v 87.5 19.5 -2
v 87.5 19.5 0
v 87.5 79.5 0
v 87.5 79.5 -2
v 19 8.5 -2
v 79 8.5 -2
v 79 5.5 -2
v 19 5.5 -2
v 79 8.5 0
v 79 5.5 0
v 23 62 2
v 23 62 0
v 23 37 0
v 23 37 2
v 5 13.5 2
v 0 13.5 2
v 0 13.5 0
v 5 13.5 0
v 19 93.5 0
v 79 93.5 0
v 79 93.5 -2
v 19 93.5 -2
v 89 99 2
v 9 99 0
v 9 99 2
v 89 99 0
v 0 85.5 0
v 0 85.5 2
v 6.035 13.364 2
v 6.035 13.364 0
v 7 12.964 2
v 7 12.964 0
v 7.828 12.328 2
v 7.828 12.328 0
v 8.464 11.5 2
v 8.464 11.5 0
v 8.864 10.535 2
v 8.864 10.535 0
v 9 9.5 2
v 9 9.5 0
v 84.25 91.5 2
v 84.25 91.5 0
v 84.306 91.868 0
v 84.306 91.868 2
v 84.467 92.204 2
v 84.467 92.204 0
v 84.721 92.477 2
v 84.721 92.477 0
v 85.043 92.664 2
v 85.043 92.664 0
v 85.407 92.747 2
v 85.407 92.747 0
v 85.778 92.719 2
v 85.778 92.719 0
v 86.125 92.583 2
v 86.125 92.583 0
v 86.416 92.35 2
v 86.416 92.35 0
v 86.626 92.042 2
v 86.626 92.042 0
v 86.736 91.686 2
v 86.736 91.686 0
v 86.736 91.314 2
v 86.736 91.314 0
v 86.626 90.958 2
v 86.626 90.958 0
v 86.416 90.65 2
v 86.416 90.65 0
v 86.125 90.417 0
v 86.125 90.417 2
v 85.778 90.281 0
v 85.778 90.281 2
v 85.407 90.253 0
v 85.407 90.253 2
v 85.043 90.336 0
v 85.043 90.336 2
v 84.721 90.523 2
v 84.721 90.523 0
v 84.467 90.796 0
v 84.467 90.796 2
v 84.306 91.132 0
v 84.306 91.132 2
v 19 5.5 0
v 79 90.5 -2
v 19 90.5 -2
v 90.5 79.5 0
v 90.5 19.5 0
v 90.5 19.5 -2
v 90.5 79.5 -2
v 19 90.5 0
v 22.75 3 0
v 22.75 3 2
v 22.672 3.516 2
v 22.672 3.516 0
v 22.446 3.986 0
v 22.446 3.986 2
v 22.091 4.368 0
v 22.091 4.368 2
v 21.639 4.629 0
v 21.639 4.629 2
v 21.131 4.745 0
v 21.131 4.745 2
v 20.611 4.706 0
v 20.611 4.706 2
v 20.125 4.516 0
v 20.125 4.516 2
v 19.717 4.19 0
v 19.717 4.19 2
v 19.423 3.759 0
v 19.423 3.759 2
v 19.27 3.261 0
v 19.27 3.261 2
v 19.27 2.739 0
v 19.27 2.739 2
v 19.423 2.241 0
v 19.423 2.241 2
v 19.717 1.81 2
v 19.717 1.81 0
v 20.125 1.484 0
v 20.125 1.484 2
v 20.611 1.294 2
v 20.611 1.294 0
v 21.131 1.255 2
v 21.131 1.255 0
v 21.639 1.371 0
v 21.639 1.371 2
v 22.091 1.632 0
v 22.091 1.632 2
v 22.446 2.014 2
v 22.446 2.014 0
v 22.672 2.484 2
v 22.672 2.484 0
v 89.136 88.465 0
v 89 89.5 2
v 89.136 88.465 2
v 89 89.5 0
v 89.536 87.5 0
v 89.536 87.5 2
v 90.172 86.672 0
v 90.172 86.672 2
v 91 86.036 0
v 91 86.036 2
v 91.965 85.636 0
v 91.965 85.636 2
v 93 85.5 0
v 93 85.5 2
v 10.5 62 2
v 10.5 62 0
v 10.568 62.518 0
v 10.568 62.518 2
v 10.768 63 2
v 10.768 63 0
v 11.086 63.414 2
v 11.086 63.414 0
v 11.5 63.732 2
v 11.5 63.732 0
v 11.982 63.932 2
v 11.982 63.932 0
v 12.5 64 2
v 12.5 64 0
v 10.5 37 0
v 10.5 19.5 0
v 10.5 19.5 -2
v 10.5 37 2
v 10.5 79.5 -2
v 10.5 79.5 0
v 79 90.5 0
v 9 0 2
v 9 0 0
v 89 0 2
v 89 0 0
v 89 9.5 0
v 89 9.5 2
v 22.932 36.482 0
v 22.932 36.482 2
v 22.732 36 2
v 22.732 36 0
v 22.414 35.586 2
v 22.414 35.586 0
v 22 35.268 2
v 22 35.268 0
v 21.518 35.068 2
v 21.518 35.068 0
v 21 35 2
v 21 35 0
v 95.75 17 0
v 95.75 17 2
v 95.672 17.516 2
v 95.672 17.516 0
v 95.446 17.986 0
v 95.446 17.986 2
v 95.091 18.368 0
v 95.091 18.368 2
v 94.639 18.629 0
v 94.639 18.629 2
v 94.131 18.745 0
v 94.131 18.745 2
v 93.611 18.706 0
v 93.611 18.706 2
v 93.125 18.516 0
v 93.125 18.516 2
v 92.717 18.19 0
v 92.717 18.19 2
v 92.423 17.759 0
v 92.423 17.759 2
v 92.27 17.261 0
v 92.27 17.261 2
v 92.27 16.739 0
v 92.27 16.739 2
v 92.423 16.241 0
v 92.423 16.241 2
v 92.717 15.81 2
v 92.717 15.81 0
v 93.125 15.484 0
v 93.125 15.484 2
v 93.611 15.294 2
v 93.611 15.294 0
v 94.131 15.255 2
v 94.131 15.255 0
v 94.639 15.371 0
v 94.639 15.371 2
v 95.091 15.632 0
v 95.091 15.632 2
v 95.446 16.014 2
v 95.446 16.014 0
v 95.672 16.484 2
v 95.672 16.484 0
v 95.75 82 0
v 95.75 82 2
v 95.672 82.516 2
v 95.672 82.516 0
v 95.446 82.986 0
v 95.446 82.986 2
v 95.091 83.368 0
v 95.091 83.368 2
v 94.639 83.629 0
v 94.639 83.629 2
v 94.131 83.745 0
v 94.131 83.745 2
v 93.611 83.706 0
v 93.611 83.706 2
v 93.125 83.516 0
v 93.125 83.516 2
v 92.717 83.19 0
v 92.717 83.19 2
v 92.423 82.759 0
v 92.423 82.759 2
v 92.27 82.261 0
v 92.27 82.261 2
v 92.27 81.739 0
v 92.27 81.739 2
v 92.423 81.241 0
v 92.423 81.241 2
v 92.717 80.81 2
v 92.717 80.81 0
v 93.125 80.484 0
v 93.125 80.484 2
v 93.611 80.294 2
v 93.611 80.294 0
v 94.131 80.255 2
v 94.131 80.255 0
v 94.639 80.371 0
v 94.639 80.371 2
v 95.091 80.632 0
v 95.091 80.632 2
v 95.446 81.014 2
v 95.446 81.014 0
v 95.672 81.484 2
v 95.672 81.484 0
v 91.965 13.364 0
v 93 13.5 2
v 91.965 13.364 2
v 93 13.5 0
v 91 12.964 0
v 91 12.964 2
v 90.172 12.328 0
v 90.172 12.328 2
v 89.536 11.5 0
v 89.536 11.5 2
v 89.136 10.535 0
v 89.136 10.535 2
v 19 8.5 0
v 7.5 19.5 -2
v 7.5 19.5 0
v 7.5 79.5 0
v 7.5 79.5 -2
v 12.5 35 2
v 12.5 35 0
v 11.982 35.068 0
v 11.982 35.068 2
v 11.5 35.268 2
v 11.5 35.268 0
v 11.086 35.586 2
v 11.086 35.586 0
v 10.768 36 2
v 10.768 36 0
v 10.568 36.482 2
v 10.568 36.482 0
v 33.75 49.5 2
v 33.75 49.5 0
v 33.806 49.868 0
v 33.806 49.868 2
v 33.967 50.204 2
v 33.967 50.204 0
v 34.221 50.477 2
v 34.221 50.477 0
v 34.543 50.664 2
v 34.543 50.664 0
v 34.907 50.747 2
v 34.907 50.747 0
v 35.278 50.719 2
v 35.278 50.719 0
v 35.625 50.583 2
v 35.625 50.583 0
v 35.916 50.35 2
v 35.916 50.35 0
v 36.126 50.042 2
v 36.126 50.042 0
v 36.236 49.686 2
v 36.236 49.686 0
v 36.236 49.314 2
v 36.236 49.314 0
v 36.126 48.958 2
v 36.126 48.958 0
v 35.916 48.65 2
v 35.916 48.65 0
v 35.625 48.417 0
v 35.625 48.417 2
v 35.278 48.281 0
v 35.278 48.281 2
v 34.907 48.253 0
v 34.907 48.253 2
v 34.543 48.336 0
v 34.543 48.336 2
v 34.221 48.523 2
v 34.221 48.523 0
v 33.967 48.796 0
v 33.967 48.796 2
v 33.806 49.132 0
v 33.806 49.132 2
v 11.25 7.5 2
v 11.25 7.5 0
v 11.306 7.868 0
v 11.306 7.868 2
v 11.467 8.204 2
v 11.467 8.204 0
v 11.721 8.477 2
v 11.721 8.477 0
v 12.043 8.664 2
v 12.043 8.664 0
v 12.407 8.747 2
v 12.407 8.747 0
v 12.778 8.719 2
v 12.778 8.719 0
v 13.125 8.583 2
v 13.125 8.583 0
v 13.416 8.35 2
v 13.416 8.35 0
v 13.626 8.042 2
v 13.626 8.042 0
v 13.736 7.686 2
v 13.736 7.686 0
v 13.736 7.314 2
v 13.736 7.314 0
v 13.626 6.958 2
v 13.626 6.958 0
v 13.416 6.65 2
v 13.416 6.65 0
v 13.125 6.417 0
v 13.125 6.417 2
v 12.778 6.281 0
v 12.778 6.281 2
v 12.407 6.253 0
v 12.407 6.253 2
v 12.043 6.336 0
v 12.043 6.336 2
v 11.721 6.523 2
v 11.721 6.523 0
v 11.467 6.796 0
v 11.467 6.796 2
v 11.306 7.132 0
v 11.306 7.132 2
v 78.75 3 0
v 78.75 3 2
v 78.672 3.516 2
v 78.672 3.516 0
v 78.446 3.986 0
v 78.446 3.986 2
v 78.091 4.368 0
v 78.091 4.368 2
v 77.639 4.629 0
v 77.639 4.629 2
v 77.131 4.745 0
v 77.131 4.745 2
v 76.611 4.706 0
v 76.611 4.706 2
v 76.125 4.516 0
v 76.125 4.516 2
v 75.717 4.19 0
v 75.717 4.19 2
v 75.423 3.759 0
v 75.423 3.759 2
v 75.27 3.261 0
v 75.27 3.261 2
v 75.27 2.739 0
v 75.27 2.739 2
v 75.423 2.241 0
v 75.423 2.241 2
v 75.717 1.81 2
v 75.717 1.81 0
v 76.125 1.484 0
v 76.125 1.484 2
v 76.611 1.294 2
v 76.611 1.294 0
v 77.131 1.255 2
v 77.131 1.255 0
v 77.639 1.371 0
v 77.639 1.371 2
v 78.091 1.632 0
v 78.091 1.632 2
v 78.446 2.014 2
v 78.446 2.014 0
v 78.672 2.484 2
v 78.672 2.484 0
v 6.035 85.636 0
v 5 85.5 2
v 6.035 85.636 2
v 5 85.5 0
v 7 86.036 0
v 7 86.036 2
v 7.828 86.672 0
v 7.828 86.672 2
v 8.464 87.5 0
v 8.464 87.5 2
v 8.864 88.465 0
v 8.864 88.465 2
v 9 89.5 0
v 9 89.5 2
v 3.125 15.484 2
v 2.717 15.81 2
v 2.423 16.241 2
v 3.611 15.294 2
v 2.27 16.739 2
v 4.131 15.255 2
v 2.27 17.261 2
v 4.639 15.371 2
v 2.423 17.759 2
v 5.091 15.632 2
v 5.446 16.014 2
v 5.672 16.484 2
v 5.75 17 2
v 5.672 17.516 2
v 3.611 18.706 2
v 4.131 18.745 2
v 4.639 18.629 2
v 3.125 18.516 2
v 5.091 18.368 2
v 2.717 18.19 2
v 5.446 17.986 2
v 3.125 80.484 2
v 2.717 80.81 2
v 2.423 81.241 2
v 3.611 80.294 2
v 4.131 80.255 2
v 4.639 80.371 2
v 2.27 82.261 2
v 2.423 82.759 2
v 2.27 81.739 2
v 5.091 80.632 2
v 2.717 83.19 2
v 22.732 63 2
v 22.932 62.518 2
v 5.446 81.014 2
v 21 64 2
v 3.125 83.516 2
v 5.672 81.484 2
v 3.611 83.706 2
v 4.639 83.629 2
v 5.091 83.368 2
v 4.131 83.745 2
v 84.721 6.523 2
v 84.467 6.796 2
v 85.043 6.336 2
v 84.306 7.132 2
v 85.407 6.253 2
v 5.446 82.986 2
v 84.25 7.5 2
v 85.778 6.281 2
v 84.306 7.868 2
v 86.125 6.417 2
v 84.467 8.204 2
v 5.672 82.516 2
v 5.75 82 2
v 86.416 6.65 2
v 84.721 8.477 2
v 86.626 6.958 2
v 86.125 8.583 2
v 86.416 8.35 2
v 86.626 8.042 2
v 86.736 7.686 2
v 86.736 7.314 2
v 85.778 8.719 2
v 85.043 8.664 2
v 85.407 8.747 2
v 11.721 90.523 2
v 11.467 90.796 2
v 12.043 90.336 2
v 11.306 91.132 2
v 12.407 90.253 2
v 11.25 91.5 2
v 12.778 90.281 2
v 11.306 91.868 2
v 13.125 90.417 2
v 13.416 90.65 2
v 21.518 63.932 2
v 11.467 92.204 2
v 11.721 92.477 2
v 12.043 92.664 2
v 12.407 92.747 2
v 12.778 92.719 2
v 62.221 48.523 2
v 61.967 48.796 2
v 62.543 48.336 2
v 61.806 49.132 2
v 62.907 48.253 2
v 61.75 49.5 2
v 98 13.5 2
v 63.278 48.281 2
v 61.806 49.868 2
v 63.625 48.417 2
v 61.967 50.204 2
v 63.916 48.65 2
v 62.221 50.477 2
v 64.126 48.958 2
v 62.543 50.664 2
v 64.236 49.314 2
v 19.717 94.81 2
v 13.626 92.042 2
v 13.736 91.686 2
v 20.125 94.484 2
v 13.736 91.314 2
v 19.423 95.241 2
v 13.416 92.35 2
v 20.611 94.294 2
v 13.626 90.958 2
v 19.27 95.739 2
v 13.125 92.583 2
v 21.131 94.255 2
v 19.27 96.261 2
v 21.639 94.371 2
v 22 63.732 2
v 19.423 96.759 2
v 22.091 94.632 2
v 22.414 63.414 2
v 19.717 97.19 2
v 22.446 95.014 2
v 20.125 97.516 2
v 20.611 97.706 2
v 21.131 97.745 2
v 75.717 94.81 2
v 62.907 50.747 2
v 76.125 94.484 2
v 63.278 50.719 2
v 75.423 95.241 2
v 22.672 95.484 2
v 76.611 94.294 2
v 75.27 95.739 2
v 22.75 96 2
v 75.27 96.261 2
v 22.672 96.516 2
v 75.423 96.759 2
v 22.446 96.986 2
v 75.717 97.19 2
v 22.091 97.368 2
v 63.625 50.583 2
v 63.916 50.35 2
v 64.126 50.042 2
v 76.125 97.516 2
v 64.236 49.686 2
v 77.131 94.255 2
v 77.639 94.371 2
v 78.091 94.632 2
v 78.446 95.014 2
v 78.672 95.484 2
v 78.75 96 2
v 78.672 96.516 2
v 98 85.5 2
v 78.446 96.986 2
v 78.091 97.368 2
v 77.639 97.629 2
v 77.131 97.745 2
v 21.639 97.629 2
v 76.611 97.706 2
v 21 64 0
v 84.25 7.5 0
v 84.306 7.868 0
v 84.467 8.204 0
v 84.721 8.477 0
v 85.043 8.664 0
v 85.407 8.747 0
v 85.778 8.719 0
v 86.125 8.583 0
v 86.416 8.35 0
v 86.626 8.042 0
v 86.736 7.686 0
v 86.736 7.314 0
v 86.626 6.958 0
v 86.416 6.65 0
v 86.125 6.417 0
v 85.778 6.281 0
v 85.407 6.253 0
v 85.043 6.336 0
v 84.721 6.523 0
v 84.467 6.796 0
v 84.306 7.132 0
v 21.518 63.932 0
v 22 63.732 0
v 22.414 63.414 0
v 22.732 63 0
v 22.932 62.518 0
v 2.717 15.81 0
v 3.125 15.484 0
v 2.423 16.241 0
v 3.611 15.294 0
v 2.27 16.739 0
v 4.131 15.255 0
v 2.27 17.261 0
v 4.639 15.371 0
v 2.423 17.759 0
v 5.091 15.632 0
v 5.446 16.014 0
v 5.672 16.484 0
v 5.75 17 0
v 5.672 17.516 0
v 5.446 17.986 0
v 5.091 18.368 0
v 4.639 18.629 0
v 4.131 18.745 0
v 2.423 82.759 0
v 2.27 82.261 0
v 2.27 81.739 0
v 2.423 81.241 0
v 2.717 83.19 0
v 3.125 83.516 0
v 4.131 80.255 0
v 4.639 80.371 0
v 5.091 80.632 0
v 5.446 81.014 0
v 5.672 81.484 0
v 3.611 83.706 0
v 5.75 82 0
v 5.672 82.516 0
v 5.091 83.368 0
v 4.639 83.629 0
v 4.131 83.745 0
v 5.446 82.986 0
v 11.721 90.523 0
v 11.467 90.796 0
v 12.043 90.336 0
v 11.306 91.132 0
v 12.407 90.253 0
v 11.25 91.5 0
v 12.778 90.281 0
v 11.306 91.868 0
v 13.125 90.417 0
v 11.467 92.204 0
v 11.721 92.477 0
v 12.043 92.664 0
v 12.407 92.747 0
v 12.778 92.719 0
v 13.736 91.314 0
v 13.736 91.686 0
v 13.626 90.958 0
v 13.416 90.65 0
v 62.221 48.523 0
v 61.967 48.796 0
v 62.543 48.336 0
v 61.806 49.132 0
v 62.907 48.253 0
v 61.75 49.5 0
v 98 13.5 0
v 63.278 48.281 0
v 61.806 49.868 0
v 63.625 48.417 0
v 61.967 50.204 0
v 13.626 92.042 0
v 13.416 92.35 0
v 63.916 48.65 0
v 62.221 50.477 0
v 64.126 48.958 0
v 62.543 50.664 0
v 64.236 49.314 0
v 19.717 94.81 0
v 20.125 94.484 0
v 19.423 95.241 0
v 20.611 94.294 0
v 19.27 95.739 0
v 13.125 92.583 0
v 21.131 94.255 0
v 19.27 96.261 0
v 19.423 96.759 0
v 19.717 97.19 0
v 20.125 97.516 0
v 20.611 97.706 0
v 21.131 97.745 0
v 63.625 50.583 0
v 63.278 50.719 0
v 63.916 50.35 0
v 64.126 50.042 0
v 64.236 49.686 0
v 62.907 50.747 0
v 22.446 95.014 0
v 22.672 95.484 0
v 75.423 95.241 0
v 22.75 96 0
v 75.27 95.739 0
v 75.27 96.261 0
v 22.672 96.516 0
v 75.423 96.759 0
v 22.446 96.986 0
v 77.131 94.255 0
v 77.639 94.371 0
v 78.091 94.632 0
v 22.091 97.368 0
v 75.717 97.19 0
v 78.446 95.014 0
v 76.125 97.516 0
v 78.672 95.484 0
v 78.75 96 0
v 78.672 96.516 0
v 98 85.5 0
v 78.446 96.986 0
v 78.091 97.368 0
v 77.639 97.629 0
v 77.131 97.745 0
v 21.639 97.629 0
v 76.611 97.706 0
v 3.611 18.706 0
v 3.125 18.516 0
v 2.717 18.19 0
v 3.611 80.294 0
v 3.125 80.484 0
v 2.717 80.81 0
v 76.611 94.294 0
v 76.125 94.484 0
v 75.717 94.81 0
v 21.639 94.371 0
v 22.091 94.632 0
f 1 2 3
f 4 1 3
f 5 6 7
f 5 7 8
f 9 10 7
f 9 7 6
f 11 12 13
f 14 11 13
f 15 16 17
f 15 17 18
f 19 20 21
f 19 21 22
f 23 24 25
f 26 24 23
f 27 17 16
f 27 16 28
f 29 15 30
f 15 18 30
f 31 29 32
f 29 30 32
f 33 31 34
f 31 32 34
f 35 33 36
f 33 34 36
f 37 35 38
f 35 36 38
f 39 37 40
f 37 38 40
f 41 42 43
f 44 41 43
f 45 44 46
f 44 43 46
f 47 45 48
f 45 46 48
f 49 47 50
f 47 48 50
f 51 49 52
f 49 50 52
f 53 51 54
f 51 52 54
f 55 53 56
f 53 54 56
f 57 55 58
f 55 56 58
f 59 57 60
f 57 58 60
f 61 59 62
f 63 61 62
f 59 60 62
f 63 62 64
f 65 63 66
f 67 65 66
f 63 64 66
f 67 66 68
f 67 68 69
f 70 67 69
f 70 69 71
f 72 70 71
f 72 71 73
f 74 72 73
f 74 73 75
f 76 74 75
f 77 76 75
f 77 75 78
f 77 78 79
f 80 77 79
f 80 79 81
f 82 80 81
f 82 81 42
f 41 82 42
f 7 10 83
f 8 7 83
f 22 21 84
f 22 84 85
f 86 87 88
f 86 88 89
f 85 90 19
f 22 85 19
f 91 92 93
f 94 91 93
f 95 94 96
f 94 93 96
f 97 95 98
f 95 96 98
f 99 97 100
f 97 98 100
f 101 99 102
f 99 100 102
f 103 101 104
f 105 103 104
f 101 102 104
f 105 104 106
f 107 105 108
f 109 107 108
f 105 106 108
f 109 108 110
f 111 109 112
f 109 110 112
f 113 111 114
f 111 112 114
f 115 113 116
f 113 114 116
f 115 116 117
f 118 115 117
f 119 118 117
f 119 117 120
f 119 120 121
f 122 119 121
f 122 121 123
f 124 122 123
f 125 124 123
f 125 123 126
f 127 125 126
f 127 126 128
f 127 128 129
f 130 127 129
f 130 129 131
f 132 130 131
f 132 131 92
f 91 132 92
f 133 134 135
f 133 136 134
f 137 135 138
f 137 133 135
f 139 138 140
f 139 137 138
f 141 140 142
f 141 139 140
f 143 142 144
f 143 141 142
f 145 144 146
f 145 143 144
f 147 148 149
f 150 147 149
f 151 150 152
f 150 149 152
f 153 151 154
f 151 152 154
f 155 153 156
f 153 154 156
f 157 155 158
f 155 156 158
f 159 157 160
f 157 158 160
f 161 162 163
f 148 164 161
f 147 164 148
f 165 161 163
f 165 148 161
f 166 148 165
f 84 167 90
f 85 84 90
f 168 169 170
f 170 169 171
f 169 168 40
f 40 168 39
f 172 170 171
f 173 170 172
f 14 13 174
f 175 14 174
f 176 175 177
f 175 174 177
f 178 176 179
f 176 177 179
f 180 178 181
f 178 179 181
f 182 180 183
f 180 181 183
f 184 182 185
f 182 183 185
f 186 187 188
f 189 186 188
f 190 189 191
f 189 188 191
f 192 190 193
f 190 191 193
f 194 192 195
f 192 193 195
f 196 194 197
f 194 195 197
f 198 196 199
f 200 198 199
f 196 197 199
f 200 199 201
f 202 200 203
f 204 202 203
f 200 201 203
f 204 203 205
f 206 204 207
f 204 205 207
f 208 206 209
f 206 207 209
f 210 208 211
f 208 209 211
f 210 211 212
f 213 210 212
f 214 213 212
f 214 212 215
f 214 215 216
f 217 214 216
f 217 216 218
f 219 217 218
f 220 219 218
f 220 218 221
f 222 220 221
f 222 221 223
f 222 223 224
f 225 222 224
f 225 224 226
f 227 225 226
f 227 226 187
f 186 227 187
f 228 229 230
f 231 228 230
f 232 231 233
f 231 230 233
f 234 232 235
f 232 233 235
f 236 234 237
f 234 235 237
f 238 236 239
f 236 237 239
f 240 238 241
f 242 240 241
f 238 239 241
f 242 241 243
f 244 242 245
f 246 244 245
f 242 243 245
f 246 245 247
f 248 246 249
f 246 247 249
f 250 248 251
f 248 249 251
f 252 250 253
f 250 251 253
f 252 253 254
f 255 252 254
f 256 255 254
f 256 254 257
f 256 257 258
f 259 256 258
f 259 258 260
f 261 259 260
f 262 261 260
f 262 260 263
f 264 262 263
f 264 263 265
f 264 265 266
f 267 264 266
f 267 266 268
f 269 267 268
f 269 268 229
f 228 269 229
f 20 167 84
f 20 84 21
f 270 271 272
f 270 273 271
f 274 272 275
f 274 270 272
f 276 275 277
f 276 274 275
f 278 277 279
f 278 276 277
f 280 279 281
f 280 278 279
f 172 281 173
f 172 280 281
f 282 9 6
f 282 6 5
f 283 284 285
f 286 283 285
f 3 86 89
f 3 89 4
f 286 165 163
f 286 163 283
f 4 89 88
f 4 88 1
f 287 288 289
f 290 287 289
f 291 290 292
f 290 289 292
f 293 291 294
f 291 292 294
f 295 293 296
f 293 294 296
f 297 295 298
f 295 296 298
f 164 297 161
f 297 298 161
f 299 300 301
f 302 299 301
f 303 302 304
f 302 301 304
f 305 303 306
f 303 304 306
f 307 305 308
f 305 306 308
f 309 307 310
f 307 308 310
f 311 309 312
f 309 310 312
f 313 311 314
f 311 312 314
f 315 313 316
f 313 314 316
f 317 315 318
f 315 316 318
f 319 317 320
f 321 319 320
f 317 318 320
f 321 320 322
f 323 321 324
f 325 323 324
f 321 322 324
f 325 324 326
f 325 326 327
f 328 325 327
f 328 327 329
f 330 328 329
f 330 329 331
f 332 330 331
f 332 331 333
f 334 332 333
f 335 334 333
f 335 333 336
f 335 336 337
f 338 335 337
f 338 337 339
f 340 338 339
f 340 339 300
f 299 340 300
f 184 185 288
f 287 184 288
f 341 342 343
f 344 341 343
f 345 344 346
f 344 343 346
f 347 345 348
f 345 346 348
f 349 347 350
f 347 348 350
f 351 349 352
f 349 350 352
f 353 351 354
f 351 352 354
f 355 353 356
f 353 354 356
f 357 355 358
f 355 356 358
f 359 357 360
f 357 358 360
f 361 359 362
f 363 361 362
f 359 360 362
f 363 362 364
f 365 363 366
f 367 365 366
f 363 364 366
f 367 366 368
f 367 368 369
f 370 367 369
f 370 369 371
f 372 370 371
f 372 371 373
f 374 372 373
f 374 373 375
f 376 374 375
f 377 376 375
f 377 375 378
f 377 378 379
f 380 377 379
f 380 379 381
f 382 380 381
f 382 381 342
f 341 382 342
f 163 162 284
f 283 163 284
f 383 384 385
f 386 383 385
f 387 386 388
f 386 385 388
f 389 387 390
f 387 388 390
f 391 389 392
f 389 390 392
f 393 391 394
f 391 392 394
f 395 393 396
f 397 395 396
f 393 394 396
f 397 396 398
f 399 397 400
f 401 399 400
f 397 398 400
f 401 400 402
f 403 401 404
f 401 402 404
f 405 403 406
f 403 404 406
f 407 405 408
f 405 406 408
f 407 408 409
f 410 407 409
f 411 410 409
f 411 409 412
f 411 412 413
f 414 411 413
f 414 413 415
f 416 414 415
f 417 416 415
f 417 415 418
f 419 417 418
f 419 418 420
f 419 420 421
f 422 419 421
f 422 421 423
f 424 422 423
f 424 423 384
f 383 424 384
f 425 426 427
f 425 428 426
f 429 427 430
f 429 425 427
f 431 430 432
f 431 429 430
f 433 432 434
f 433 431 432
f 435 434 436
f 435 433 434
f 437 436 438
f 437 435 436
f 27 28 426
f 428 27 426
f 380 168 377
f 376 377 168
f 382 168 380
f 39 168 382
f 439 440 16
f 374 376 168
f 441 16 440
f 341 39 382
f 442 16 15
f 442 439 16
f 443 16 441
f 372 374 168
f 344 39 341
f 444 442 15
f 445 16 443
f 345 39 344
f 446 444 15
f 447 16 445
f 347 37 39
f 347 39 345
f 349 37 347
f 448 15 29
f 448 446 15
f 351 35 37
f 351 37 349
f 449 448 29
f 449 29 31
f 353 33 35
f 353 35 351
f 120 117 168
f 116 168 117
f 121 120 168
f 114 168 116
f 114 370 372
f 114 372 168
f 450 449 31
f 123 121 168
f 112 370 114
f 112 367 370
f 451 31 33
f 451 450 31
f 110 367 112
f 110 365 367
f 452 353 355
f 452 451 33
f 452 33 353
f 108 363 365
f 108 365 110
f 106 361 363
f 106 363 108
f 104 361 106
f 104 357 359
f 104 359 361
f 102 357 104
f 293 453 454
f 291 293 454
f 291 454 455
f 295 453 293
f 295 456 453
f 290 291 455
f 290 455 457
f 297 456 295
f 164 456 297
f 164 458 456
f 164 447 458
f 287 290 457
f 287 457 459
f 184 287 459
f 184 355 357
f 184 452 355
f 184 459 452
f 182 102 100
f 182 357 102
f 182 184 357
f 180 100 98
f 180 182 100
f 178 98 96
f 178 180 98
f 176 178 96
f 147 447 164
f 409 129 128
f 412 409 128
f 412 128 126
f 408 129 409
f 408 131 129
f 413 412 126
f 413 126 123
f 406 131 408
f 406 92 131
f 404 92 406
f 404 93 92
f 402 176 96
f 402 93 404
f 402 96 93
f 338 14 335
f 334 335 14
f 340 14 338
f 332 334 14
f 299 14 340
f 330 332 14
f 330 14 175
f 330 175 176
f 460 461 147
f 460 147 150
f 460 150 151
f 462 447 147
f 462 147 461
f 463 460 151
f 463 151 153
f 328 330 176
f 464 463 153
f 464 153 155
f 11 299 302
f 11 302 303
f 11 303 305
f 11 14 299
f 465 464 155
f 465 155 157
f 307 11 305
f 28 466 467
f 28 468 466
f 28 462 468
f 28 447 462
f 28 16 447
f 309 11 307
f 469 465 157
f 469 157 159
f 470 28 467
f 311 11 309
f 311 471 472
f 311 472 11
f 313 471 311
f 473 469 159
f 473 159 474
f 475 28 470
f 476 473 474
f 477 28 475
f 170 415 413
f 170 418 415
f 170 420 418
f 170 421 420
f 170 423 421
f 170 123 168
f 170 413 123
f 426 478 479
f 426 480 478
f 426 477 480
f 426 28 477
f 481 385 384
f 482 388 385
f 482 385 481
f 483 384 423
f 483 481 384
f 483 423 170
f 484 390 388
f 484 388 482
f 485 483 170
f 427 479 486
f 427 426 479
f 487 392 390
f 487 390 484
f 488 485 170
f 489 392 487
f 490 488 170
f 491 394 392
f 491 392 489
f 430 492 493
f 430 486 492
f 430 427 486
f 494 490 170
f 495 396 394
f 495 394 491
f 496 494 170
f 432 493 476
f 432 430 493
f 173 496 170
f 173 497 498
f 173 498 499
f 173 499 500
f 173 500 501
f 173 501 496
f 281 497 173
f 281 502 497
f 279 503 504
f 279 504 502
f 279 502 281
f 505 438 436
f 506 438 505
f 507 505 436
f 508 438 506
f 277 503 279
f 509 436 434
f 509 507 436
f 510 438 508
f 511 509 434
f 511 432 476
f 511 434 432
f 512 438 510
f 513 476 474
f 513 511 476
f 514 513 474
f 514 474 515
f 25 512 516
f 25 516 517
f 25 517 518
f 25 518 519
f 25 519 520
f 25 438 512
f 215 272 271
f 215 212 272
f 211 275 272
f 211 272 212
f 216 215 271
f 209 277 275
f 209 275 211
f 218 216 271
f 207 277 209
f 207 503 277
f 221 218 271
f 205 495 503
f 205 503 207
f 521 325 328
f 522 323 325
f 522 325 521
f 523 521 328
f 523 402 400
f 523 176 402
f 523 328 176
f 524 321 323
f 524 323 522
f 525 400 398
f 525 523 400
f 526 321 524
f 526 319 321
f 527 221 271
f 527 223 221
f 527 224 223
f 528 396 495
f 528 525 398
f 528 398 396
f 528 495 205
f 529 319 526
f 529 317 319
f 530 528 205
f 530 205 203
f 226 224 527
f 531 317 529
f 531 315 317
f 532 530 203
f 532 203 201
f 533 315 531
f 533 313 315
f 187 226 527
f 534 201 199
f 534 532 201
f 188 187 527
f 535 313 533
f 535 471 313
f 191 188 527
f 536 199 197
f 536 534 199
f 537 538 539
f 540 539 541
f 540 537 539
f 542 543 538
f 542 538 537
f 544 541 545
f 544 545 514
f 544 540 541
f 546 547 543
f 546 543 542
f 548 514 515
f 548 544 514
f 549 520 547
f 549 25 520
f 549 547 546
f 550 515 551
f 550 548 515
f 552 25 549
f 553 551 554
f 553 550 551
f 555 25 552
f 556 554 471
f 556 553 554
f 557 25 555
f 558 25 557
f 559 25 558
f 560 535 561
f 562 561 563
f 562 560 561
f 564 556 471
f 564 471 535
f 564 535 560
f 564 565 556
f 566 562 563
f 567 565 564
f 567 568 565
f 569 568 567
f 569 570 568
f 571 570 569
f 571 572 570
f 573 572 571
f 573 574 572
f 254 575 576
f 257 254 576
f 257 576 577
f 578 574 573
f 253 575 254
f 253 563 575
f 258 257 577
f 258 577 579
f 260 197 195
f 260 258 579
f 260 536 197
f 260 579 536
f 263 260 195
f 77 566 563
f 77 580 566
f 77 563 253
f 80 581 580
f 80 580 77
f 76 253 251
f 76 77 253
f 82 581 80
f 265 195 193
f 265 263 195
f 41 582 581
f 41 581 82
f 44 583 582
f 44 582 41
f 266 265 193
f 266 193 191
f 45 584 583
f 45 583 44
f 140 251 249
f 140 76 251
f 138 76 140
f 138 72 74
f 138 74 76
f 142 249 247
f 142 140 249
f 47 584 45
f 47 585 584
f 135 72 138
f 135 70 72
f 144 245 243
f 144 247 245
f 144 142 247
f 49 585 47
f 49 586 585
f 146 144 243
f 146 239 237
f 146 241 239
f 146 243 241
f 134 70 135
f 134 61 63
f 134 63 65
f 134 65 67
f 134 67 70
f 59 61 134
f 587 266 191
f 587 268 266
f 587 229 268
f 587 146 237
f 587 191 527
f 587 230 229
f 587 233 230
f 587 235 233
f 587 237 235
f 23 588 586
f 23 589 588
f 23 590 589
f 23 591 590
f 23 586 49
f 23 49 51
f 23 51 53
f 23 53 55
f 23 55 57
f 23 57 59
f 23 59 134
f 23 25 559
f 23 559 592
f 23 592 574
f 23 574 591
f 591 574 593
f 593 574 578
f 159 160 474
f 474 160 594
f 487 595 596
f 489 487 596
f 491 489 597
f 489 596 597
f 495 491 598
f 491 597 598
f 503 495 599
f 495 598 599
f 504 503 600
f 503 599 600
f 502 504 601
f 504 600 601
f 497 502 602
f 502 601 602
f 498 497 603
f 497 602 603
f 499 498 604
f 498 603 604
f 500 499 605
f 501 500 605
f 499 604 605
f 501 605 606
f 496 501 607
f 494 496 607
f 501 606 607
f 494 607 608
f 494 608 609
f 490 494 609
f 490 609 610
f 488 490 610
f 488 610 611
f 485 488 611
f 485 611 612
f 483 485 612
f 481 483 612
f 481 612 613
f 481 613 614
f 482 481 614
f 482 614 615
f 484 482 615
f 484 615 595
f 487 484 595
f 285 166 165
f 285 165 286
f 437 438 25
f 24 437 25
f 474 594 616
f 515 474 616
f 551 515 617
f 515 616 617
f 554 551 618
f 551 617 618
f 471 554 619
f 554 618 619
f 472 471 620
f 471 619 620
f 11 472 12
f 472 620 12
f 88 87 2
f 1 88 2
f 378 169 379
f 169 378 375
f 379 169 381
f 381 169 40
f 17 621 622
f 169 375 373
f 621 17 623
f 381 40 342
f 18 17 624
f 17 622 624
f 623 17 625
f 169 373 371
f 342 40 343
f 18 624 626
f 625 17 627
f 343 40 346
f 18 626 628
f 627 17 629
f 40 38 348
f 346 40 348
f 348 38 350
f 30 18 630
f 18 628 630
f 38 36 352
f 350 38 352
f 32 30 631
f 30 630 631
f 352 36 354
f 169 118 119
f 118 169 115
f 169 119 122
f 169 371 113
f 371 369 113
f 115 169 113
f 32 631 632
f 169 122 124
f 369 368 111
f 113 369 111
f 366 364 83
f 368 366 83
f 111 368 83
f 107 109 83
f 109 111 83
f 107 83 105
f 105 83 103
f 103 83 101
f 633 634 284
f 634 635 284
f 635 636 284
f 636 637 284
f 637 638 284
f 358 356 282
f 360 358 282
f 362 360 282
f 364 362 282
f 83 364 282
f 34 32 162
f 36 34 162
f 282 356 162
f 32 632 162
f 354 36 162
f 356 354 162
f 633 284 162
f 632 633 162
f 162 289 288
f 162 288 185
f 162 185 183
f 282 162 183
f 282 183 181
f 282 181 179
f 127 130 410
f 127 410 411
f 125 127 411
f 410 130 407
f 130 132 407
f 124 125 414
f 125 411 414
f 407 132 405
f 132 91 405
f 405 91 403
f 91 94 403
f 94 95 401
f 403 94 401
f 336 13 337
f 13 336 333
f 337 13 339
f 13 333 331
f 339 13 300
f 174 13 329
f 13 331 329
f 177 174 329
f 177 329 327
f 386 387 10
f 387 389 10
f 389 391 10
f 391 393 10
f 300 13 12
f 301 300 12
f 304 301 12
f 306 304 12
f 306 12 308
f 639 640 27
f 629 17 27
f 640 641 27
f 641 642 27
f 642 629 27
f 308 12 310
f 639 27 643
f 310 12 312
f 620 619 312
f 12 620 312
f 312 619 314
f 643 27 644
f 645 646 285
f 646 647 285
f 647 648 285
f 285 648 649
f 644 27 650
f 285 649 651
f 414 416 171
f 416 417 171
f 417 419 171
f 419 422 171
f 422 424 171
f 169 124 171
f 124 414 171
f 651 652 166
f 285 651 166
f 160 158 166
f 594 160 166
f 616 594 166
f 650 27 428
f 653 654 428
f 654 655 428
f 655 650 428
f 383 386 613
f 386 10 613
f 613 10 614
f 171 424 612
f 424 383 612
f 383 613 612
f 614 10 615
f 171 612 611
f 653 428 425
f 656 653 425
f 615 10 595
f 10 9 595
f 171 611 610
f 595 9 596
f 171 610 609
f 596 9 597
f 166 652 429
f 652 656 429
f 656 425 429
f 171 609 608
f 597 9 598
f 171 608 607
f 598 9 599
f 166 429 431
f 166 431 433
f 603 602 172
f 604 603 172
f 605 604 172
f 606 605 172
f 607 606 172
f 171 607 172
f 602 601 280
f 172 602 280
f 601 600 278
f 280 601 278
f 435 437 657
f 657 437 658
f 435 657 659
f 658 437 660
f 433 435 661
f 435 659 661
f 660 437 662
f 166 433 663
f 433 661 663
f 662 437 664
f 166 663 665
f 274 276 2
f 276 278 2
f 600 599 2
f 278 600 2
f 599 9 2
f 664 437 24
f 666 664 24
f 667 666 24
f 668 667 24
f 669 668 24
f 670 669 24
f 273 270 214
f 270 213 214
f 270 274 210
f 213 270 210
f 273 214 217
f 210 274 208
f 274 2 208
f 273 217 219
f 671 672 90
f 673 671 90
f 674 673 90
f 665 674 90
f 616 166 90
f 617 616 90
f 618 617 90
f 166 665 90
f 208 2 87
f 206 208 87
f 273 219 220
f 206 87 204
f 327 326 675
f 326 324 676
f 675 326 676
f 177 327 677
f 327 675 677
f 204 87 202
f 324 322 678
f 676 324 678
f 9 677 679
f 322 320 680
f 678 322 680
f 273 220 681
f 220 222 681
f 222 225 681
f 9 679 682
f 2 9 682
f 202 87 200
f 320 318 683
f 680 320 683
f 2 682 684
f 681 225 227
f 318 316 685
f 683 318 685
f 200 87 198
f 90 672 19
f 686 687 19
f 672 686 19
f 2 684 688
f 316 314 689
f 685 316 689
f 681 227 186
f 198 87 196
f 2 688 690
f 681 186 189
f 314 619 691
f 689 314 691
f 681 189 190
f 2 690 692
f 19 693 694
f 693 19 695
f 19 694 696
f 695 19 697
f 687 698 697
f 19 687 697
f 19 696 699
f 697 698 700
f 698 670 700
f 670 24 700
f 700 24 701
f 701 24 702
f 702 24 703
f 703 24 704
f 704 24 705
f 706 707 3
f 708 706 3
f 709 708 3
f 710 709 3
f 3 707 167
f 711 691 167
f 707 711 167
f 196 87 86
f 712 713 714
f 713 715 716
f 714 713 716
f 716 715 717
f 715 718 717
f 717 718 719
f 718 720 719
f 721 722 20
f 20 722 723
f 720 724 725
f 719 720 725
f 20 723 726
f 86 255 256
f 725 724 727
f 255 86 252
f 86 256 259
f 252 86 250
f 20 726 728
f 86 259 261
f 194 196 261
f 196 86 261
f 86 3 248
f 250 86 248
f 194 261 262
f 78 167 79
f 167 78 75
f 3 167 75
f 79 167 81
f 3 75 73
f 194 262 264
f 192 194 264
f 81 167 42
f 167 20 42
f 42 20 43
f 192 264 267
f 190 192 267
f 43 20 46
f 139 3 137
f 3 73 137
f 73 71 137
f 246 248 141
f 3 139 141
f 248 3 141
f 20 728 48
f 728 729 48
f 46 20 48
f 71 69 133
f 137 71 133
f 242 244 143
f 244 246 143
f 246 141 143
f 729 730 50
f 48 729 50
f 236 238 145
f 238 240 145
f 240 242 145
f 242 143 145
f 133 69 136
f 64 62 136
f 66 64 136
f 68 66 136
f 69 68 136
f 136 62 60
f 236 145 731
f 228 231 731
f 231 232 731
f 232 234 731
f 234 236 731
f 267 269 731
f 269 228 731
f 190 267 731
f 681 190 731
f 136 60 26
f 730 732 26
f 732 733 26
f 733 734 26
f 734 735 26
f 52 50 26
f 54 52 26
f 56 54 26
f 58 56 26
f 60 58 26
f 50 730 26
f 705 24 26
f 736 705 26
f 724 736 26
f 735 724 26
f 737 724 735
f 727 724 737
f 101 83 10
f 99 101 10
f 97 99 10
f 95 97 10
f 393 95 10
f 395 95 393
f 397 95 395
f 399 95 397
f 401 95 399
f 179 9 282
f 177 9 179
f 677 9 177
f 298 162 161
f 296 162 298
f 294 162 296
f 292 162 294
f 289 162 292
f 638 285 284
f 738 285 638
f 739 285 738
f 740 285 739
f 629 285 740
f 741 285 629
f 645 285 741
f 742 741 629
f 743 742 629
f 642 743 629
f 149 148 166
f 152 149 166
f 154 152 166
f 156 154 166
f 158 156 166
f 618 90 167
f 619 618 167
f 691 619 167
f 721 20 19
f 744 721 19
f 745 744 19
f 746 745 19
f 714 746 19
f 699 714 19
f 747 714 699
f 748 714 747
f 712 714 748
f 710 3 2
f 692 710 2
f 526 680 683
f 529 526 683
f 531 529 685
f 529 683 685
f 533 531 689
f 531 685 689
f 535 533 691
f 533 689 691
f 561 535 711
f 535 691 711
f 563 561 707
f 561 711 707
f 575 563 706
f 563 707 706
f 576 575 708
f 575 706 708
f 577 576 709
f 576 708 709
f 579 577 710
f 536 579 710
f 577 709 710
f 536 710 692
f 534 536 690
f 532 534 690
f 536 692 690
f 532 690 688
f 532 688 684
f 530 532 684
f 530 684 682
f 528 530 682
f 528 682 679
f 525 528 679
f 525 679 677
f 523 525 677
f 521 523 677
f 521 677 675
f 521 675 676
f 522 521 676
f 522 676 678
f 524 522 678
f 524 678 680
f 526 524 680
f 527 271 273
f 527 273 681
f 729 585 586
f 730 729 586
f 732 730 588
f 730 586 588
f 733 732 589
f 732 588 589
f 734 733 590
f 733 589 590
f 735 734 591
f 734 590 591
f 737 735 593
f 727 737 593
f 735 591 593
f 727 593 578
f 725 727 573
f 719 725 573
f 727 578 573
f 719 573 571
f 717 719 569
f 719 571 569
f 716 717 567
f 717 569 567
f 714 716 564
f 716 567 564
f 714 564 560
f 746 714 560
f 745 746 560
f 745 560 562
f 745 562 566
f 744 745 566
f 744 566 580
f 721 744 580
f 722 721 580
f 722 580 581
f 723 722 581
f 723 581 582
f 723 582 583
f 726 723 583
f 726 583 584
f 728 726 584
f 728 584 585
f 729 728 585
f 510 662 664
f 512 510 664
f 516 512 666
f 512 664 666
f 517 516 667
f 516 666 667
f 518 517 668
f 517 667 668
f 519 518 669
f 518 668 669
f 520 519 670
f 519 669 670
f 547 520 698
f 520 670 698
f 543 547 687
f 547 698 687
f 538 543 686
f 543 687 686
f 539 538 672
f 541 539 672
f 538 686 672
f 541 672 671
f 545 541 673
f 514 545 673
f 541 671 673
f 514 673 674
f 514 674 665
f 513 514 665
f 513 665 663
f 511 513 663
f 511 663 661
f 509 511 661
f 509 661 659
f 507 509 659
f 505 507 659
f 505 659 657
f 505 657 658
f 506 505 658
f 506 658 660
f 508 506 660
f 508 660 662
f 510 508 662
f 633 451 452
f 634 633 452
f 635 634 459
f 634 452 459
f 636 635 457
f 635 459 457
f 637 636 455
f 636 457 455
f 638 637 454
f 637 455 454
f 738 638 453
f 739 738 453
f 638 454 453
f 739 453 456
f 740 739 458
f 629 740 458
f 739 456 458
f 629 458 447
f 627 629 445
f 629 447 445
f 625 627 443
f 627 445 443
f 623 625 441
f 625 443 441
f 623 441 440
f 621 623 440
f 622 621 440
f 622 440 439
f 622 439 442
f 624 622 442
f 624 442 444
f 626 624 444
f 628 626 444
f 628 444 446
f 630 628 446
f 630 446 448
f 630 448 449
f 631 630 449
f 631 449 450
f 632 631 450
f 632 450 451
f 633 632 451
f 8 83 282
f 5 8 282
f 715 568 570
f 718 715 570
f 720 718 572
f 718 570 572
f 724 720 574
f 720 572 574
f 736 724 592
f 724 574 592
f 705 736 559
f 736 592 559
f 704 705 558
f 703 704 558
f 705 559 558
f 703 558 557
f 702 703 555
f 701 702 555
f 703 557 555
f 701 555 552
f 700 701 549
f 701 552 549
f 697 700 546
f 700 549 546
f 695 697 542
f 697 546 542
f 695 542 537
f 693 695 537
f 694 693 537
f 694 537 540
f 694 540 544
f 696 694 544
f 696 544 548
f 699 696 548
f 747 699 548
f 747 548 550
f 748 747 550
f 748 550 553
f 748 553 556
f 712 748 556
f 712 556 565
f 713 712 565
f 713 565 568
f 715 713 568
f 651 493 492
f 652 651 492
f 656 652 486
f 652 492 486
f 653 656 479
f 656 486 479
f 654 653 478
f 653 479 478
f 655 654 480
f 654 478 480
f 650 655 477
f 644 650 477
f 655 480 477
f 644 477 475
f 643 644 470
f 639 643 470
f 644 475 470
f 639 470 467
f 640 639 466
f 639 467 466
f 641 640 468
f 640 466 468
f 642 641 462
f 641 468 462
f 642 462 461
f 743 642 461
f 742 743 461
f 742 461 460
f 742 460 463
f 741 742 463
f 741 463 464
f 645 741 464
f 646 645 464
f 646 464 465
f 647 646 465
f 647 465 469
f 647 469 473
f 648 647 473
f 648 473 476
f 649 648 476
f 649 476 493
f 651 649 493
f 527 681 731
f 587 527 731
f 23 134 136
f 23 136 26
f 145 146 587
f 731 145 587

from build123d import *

# Parameters (mm, degrees)
SKETCH1_W                 = 98
SKETCH1_H                 = 99
MAIN_BODY_DEPTH           = 2
SKETCH2_R                 = 1.75
FRONTBACKBOLTHOLES_DEPTH  = 140.316187143
SKETCH3_R                 = 1.75
SIDEBOLTHOLES_DEPTH       = 140.316187143
M3X0_5_TAPPED_HOLE1_D     = 2.5
M3X0_5_TAPPED_HOLE1_DEPTH = 7.5
M3X0_5_TAPPED_HOLE1_TIP   = 0.751075774
SKETCH7_W                 = 9
SKETCH7_H                 = 13.5
CUT_EXTRUDE3_DEPTH        = 140.316187143
FILLET1_R                 = 4
SKETCH8_W                 = 60
SKETCH8_H                 = 3
BOSS_EXTRUDE2_DEPTH       = 2
SKETCH9_W                 = 3
SKETCH9_H                 = 60
BOSS_EXTRUDE3_DEPTH       = 2
CUT_EXTRUDE5_DEPTH        = 140.316187143


with BuildPart() as part:
    # Sketch1 → Main Body (new body)
    with BuildSketch(Plane.XY):
        with Locations((49, 49.5)):
            Rectangle(SKETCH1_W, SKETCH1_H)
    extrude(amount=MAIN_BODY_DEPTH)

    # Sketch2 → FrontBackBoltHoles (cut, through all)
    with BuildSketch(Plane.XY.offset(2)):
        with Locations((4, 82)):
            Circle(SKETCH2_R)
        with Locations((94, 82)):
            Circle(SKETCH2_R)
        with Locations((94, 17)):
            Circle(SKETCH2_R)
        with Locations((4, 17)):
            Circle(SKETCH2_R)
    extrude(amount=-FRONTBACKBOLTHOLES_DEPTH, mode=Mode.SUBTRACT)

    # Sketch3 → SideBoltHoles (cut, through all)
    with BuildSketch(Plane.XY.offset(2)):
        with Locations((21, 96)):
            Circle(SKETCH3_R)
        with Locations((77, 96)):
            Circle(SKETCH3_R)
        with Locations((77, 3)):
            Circle(SKETCH3_R)
        with Locations((21, 3)):
            Circle(SKETCH3_R)
    extrude(amount=-SIDEBOLTHOLES_DEPTH, mode=Mode.SUBTRACT)

    # M3x0.5 Tapped Hole1
    with Locations(Plane.XY.offset(2)):
        with Locations((12.5, 91.5), (85.5, 91.5), (85.5, 7.5), (12.5, 7.5), (35, 49.5), (63, 49.5)):
            Hole(M3X0_5_TAPPED_HOLE1_D / 2, depth=M3X0_5_TAPPED_HOLE1_DEPTH)
            with Locations((0, 0, -(M3X0_5_TAPPED_HOLE1_DEPTH + M3X0_5_TAPPED_HOLE1_TIP / 2))):  # 118° drill point
                Cone(0, M3X0_5_TAPPED_HOLE1_D / 2, M3X0_5_TAPPED_HOLE1_TIP, mode=Mode.SUBTRACT)

    # Sketch7 → Cut-Extrude3 (cut, through all)
    with BuildSketch(Plane.XY.offset(2)):
        with Locations((4.5, 92.25)):
            Rectangle(SKETCH7_W, SKETCH7_H)
        with Locations((93.5, 92.25)):
            Rectangle(SKETCH7_W, SKETCH7_H)
        with Locations((93.5, 6.75)):
            Rectangle(SKETCH7_W, SKETCH7_H)
        with Locations((4.5, 6.75)):
            Rectangle(SKETCH7_W, SKETCH7_H)
    extrude(amount=-CUT_EXTRUDE3_DEPTH, mode=Mode.SUBTRACT)

    # Fillet1
    fillet1_edges = [part.edges().sort_by_distance(p)[0] for p in [
        (89, 85.5, 1),
        (9, 13.5, 1),
        (89, 13.5, 1),
        (9, 85.5, 1),
    ]]
    fillet(fillet1_edges, radius=FILLET1_R)

    # Sketch8 → Boss-Extrude2 (add)
    with BuildSketch(Plane(origin=(0, 0, 0), x_dir=(-1, 0, 0), z_dir=(0, 0, -1))):
        with Locations((-49, 92)):
            Rectangle(SKETCH8_W, SKETCH8_H)
        with Locations((-49, 7)):
            Rectangle(SKETCH8_W, SKETCH8_H)
    extrude(amount=BOSS_EXTRUDE2_DEPTH)

    # Sketch9 → Boss-Extrude3 (add)
    with BuildSketch(Plane(origin=(0, 0, 0), x_dir=(-1, 0, 0), z_dir=(0, 0, -1))):
        with Locations((-89, 49.5)):
            Rectangle(SKETCH9_W, SKETCH9_H)
        with Locations((-9, 49.5)):
            Rectangle(SKETCH9_W, SKETCH9_H)
    extrude(amount=BOSS_EXTRUDE3_DEPTH)

    # Sketch11 → Cut-Extrude5 (cut, through all)
    with BuildSketch(Plane(origin=(0, 0, 0), x_dir=(-1, 0, 0), z_dir=(0, 0, -1))):
        with BuildLine():
            Line((-10.5, 37), (-10.5, 62))
            ThreePointArc((-10.5, 62), (-11.085786438, 63.414213562), (-12.5, 64))
            ThreePointArc((-12.5, 64), (-13.914213562, 63.414213562), (-14.5, 62))
            Line((-14.5, 62), (-14.5, 37))
            ThreePointArc((-14.5, 37), (-13.914213562, 35.585786438), (-12.5, 35))
            ThreePointArc((-12.5, 35), (-11.085786438, 35.585786438), (-10.5, 37))
        make_face()
        with BuildLine():
            ThreePointArc((-14.5, 62), (-13.914213562, 63.414213562), (-12.5, 64))
            Line((-12.5, 64), (-21, 64))
            ThreePointArc((-21, 64), (-19.585786438, 63.414213562), (-19, 62))
            Line((-19, 62), (-19, 37))
            ThreePointArc((-19, 37), (-19.585786438, 35.585786438), (-21, 35))
            Line((-21, 35), (-12.5, 35))
            ThreePointArc((-12.5, 35), (-13.914213562, 35.585786438), (-14.5, 37))
            Line((-14.5, 37), (-14.5, 62))
        make_face()
        with BuildLine():
            Line((-23, 62), (-23, 37))
            ThreePointArc((-23, 37), (-21, 35), (-19, 37))
            Line((-19, 37), (-19, 62))
            ThreePointArc((-19, 62), (-21, 64), (-23, 62))
        make_face()
    extrude(amount=-CUT_EXTRUDE5_DEPTH, mode=Mode.SUBTRACT)


solid = part.part
